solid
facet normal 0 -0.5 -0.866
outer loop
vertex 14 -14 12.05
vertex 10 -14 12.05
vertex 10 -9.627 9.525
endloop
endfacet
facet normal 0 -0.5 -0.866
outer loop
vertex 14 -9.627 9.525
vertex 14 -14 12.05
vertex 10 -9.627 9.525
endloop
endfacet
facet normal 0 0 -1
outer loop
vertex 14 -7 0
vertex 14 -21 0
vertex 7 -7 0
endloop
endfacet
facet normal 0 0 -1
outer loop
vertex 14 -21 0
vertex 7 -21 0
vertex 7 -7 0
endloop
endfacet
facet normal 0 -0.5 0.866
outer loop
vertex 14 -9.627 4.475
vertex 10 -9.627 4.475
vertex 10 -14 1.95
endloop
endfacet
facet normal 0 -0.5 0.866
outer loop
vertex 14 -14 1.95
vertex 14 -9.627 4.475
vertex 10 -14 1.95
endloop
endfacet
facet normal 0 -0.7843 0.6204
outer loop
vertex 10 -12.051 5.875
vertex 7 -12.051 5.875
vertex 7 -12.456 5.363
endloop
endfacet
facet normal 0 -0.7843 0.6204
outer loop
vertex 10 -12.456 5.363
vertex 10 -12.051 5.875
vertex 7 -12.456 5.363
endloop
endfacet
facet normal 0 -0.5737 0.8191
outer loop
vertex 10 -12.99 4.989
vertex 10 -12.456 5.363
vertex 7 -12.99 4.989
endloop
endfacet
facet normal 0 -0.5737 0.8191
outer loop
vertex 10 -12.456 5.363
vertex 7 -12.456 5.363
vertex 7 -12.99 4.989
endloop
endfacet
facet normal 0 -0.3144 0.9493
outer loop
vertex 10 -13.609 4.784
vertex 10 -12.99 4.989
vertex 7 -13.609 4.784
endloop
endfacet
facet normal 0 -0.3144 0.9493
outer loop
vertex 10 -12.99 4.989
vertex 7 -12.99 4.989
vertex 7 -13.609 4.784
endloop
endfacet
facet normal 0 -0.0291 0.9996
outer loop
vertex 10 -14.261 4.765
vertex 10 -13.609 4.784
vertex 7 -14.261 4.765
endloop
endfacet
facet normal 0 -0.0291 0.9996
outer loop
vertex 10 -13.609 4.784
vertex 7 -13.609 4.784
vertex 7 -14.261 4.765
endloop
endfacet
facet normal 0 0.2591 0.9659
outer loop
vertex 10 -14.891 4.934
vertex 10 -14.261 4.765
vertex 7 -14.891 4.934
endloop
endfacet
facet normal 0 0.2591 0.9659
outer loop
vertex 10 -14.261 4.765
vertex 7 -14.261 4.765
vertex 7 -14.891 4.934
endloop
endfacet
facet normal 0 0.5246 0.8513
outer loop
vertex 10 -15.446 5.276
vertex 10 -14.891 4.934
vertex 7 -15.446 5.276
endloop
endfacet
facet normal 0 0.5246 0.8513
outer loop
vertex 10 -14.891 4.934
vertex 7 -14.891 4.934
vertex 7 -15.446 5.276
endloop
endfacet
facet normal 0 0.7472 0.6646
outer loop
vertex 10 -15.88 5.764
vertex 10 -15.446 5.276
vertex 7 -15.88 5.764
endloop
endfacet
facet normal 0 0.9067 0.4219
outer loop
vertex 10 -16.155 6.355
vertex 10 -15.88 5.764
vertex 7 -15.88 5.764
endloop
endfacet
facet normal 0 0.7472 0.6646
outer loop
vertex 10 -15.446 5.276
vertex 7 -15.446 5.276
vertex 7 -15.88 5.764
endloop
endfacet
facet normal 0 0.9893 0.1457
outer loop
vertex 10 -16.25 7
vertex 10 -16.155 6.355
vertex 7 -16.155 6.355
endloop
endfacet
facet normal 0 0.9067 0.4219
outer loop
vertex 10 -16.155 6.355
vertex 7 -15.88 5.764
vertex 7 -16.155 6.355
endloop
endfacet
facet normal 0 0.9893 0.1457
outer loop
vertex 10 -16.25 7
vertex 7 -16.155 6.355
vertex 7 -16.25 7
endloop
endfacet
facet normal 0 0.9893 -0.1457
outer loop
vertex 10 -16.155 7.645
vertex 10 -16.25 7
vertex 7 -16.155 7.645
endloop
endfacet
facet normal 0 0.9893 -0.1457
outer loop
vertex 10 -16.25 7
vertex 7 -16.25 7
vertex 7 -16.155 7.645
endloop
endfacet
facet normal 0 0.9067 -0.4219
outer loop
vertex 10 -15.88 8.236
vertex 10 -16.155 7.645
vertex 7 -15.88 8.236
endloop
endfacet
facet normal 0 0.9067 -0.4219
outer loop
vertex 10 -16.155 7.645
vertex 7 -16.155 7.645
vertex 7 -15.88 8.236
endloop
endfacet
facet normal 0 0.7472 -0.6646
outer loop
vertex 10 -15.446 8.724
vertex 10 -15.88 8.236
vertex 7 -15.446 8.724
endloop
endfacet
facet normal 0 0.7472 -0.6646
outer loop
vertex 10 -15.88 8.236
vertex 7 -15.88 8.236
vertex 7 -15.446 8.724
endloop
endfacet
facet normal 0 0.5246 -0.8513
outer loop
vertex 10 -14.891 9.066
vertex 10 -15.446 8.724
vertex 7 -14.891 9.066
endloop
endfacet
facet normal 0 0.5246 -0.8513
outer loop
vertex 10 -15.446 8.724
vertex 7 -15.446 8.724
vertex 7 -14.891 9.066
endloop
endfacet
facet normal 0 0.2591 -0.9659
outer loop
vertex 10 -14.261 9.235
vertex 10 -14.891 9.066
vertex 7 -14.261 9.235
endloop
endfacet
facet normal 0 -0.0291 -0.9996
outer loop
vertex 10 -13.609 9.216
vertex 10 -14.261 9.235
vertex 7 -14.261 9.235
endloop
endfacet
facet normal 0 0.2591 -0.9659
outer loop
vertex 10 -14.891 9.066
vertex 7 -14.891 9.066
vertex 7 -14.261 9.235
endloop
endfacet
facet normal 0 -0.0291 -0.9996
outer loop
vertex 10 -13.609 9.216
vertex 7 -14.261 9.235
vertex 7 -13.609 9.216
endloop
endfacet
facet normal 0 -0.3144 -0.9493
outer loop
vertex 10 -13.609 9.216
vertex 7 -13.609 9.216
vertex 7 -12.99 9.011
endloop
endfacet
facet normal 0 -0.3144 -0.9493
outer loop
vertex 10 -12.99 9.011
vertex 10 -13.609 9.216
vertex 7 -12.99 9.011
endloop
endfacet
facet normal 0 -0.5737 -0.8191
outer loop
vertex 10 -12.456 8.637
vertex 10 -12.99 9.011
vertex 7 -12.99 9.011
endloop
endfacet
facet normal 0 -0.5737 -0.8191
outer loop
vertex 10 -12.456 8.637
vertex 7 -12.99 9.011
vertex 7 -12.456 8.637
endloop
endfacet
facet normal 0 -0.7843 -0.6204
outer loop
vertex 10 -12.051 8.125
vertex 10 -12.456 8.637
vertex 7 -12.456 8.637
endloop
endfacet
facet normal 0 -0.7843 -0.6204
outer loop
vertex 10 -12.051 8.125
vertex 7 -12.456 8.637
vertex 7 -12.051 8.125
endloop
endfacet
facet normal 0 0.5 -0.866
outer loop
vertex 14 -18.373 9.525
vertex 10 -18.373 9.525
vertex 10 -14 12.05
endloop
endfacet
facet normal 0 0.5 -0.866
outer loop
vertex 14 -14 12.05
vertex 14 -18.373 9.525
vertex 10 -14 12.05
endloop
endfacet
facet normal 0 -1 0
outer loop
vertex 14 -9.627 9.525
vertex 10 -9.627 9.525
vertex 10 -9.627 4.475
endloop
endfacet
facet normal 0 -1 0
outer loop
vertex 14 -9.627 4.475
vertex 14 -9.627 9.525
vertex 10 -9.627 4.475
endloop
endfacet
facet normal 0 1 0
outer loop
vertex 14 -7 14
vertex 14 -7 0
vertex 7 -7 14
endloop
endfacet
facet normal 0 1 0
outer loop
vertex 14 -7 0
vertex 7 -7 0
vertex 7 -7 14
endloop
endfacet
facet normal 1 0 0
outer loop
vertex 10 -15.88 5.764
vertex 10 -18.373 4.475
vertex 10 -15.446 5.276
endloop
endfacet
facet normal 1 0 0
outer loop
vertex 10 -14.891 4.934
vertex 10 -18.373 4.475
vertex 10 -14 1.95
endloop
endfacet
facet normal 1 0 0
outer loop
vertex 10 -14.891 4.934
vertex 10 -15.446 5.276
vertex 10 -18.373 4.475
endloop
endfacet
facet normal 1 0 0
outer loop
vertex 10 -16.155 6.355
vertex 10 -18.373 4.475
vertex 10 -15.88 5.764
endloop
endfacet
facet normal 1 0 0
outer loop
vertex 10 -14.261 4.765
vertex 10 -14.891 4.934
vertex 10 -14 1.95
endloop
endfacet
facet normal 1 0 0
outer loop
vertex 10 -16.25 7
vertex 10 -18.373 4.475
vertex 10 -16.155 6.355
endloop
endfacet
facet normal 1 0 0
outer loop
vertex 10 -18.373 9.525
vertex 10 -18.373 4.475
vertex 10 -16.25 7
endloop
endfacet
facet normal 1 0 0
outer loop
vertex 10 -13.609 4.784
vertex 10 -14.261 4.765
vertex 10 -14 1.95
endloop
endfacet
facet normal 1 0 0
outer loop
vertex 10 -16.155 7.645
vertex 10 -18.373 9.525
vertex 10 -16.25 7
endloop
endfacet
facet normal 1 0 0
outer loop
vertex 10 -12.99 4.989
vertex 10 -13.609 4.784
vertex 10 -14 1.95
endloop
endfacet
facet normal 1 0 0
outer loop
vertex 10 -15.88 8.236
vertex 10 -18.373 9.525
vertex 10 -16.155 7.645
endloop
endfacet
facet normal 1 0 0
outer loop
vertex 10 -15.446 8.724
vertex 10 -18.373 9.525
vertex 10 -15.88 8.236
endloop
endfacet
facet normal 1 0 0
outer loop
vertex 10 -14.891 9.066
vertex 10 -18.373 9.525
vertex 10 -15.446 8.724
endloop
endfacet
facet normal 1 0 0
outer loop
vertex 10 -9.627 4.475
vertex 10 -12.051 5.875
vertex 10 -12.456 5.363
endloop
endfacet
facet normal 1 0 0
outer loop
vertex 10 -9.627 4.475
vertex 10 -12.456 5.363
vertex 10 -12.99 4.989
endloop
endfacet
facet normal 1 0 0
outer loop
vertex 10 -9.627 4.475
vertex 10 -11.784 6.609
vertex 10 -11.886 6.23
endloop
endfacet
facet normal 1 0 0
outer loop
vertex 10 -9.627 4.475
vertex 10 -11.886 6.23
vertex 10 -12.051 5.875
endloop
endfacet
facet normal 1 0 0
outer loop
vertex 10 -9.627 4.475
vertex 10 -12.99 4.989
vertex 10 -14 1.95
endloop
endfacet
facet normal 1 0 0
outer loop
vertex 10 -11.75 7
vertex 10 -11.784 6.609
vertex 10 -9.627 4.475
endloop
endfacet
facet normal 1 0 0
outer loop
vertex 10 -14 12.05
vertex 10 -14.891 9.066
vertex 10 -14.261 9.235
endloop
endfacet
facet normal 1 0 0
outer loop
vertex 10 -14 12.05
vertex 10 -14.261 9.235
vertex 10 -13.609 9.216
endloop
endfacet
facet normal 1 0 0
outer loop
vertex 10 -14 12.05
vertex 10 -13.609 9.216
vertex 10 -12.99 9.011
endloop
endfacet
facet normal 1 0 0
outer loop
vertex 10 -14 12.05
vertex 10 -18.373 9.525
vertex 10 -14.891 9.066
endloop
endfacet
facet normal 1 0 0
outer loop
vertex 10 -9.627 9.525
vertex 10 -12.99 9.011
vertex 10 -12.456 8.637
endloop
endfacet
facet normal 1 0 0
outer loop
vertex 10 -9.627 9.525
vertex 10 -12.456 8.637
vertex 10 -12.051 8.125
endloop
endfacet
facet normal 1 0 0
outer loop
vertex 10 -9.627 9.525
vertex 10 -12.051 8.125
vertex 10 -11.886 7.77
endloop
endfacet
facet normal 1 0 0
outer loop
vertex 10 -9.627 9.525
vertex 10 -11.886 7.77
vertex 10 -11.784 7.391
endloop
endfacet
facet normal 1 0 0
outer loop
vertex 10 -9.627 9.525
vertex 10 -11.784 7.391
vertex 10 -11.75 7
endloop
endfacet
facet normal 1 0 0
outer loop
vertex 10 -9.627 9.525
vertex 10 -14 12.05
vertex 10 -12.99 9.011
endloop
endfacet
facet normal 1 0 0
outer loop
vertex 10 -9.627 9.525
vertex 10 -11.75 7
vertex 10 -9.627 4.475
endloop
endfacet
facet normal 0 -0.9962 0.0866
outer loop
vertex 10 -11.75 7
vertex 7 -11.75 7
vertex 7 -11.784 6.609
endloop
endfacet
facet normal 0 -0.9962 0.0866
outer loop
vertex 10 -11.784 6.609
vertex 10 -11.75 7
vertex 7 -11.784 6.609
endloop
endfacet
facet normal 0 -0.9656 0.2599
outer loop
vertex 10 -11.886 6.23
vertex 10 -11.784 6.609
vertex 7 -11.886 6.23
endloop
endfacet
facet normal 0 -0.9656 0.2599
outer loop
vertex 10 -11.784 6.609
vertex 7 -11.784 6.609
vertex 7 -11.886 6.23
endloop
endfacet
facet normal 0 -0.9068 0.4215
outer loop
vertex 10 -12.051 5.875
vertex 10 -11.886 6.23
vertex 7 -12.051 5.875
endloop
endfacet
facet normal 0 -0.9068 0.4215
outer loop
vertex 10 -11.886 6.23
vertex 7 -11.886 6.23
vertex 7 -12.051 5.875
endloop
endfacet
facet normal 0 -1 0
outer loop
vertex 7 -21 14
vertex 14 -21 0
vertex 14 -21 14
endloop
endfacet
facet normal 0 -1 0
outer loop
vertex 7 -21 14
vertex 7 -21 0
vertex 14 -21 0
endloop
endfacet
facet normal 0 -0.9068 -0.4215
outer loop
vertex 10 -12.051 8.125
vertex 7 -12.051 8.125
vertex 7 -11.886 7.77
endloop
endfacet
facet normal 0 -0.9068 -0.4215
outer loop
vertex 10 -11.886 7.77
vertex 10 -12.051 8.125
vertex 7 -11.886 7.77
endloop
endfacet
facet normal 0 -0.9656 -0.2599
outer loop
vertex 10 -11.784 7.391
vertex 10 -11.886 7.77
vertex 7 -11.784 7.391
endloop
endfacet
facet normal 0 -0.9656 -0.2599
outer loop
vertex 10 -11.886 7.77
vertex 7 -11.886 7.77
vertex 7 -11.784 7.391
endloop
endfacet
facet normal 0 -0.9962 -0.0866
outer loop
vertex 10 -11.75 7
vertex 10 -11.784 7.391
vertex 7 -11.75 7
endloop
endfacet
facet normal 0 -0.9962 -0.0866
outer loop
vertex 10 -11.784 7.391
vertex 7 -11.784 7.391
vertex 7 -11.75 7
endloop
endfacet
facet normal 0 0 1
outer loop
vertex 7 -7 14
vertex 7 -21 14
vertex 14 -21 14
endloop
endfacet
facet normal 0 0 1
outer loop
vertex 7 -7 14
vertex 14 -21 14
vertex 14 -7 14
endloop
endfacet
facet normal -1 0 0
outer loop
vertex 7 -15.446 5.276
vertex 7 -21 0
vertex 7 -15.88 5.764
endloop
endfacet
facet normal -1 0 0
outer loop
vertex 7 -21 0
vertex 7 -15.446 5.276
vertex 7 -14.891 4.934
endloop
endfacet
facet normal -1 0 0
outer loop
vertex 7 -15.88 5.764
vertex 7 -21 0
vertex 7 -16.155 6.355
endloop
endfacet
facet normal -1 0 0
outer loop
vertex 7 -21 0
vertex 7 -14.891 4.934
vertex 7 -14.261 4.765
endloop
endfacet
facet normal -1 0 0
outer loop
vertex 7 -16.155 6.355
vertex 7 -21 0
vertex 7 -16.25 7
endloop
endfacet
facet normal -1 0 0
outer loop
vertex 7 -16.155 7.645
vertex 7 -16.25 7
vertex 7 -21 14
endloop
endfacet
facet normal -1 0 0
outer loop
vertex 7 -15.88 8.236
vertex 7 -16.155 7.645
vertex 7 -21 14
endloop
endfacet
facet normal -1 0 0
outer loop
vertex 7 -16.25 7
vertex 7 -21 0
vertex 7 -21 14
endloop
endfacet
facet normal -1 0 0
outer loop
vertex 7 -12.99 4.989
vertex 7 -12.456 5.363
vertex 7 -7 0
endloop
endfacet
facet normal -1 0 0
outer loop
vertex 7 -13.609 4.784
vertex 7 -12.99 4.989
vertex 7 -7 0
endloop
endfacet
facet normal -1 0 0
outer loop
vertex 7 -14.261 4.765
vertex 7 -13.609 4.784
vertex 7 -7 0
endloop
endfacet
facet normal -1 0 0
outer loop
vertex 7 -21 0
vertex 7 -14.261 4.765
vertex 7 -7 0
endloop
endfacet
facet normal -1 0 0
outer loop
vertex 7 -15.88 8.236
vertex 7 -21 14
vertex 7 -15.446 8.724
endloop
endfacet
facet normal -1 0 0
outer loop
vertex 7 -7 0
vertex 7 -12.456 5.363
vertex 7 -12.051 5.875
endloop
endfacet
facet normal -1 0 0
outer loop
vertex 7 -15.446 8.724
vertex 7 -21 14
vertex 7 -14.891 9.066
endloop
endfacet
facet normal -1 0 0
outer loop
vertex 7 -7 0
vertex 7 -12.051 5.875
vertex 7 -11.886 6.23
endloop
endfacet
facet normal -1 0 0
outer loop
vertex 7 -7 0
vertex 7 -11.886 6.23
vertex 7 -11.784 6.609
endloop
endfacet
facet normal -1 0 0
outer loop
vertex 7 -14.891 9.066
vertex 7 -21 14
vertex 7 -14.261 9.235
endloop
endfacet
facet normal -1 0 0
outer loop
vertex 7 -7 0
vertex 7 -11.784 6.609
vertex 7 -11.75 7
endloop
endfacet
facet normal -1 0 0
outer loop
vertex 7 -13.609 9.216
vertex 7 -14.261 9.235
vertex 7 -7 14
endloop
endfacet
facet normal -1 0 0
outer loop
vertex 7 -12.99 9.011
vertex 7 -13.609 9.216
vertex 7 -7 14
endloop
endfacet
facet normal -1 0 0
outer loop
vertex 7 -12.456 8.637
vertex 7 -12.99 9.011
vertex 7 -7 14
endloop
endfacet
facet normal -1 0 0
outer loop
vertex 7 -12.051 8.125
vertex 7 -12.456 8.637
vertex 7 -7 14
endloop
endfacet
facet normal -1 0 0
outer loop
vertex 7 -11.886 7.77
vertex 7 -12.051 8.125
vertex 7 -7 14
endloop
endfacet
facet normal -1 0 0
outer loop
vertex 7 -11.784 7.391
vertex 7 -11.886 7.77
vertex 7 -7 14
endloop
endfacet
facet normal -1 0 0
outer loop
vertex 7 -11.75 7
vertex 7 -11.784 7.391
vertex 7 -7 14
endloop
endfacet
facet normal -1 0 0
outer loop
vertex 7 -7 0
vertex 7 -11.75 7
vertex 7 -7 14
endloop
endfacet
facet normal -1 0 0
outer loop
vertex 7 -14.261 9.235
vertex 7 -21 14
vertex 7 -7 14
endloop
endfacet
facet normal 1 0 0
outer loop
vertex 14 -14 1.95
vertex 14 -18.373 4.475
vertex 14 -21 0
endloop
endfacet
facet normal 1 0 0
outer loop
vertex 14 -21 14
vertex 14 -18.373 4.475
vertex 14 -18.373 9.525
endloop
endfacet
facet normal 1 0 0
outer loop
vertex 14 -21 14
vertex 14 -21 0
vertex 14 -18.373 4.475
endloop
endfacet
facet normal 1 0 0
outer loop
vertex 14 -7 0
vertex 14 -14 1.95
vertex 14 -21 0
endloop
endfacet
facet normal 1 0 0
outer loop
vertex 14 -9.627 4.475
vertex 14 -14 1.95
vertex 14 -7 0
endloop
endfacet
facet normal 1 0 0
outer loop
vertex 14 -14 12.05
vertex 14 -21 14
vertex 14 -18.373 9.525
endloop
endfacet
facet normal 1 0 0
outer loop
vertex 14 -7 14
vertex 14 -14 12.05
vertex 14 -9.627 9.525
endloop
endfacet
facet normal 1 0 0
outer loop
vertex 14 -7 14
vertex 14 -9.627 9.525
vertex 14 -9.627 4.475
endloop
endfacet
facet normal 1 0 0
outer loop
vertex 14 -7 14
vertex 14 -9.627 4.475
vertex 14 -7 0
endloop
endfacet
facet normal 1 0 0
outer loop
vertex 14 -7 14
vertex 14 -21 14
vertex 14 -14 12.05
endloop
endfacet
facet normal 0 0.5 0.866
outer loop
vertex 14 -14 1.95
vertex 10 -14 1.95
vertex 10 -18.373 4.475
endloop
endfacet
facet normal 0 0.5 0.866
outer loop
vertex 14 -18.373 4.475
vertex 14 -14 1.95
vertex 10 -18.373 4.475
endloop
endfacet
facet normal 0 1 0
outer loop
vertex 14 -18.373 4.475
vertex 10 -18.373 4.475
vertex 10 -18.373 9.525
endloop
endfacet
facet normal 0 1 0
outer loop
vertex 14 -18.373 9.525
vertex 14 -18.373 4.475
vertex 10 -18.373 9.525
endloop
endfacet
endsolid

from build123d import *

# Parameters (mm, degrees)
F0_W     = 14
F0_H     = 14
F1_DEPTH = 3
F2_W     = 14
F2_H     = 14
F3_DEPTH = 4
F4_ANGLE = -90
F5_ANGLE = -90


# Not quite as in the source:
# - a feature names something its author has since deleted; it is built from what else it names


with BuildPart() as f1:
    # F0 (on Top) → F1 (new body)
    with BuildSketch(Plane.XY):
        Rectangle(F0_W, F0_H)
        with BuildLine():
            ThreePointArc((1.9485571585, 1.125), (2.1733331092, 0.5823428515), (2.25, 0))
            ThreePointArc((2.25, 0), (2.1733331092, -0.5823428515), (1.9485571585, -1.125))
            ThreePointArc((1.9485571585, -1.125), (-2.25, 0), (1.9485571585, 1.125))
        make_face(mode=Mode.SUBTRACT)
    extrude(amount=F1_DEPTH)

    # F2 (on face) → F3 (join)
    with BuildSketch(Plane.XY.offset(3)):
        Rectangle(F2_W, F2_H)
        with BuildLine():
            ThreePointArc((4.3734282891, 2.525), (4.8779254228, 1.3070361778), (5.05, 0))
            ThreePointArc((5.05, 0), (4.8779254228, -1.3070361778), (4.3734282891, -2.525))
            ThreePointArc((4.3734282891, -2.525), (2.525, -4.3734282891), (0, -5.05))
            ThreePointArc((0, -5.05), (-2.525, -4.3734282891), (-4.3734282891, -2.525))
            ThreePointArc((-4.3734282891, -2.525), (-5.05, 0), (-4.3734282891, 2.525))
            ThreePointArc((-4.3734282891, 2.525), (-2.525, 4.3734282891), (0, 5.05))
            ThreePointArc((0, 5.05), (2.525, 4.3734282891), (4.3734282891, 2.525))
        make_face(mode=Mode.SUBTRACT)
        with BuildLine():
            Line((-4.3734282891, -2.525), (-4.3734282891, 2.525))
            ThreePointArc((-4.3734282891, 2.525), (-5.05, 0), (-4.3734282891, -2.525))
        make_face()
        with BuildLine():
            Line((-4.3734282891, 2.525), (0, 5.05))
            ThreePointArc((0, 5.05), (-2.525, 4.3734282891), (-4.3734282891, 2.525))
        make_face()
        with BuildLine():
            Line((0, 5.05), (4.3734282891, 2.525))
            ThreePointArc((4.3734282891, 2.525), (2.525, 4.3734282891), (0, 5.05))
        make_face()
        with BuildLine():
            ThreePointArc((4.3734282891, -2.525), (4.8779254228, -1.3070361778), (5.05, 0))
            ThreePointArc((5.05, 0), (4.8779254228, 1.3070361778), (4.3734282891, 2.525))
            Line((4.3734282891, 2.525), (4.3734282891, -2.525))
        make_face()
        with BuildLine():
            ThreePointArc((0, -5.05), (2.525, -4.3734282891), (4.3734282891, -2.525))
            Line((4.3734282891, -2.525), (0, -5.05))
        make_face()
        with BuildLine():
            ThreePointArc((-4.3734282891, -2.525), (-2.525, -4.3734282891), (0, -5.05))
            Line((0, -5.05), (-4.3734282891, -2.525))
        make_face()
    extrude(amount=F3_DEPTH)


with BuildPart() as f1_1:
    # F4: moved
    add(f1.part.rotate(Axis((0, -7, 0), (-1, 0, 0)), F4_ANGLE))


with BuildPart() as f1_2:
    # F5: moved
    add(f1_1.part.rotate(Axis((7, -7, 7), (0, 0, -1)), F5_ANGLE))


solid = f1_2.part
